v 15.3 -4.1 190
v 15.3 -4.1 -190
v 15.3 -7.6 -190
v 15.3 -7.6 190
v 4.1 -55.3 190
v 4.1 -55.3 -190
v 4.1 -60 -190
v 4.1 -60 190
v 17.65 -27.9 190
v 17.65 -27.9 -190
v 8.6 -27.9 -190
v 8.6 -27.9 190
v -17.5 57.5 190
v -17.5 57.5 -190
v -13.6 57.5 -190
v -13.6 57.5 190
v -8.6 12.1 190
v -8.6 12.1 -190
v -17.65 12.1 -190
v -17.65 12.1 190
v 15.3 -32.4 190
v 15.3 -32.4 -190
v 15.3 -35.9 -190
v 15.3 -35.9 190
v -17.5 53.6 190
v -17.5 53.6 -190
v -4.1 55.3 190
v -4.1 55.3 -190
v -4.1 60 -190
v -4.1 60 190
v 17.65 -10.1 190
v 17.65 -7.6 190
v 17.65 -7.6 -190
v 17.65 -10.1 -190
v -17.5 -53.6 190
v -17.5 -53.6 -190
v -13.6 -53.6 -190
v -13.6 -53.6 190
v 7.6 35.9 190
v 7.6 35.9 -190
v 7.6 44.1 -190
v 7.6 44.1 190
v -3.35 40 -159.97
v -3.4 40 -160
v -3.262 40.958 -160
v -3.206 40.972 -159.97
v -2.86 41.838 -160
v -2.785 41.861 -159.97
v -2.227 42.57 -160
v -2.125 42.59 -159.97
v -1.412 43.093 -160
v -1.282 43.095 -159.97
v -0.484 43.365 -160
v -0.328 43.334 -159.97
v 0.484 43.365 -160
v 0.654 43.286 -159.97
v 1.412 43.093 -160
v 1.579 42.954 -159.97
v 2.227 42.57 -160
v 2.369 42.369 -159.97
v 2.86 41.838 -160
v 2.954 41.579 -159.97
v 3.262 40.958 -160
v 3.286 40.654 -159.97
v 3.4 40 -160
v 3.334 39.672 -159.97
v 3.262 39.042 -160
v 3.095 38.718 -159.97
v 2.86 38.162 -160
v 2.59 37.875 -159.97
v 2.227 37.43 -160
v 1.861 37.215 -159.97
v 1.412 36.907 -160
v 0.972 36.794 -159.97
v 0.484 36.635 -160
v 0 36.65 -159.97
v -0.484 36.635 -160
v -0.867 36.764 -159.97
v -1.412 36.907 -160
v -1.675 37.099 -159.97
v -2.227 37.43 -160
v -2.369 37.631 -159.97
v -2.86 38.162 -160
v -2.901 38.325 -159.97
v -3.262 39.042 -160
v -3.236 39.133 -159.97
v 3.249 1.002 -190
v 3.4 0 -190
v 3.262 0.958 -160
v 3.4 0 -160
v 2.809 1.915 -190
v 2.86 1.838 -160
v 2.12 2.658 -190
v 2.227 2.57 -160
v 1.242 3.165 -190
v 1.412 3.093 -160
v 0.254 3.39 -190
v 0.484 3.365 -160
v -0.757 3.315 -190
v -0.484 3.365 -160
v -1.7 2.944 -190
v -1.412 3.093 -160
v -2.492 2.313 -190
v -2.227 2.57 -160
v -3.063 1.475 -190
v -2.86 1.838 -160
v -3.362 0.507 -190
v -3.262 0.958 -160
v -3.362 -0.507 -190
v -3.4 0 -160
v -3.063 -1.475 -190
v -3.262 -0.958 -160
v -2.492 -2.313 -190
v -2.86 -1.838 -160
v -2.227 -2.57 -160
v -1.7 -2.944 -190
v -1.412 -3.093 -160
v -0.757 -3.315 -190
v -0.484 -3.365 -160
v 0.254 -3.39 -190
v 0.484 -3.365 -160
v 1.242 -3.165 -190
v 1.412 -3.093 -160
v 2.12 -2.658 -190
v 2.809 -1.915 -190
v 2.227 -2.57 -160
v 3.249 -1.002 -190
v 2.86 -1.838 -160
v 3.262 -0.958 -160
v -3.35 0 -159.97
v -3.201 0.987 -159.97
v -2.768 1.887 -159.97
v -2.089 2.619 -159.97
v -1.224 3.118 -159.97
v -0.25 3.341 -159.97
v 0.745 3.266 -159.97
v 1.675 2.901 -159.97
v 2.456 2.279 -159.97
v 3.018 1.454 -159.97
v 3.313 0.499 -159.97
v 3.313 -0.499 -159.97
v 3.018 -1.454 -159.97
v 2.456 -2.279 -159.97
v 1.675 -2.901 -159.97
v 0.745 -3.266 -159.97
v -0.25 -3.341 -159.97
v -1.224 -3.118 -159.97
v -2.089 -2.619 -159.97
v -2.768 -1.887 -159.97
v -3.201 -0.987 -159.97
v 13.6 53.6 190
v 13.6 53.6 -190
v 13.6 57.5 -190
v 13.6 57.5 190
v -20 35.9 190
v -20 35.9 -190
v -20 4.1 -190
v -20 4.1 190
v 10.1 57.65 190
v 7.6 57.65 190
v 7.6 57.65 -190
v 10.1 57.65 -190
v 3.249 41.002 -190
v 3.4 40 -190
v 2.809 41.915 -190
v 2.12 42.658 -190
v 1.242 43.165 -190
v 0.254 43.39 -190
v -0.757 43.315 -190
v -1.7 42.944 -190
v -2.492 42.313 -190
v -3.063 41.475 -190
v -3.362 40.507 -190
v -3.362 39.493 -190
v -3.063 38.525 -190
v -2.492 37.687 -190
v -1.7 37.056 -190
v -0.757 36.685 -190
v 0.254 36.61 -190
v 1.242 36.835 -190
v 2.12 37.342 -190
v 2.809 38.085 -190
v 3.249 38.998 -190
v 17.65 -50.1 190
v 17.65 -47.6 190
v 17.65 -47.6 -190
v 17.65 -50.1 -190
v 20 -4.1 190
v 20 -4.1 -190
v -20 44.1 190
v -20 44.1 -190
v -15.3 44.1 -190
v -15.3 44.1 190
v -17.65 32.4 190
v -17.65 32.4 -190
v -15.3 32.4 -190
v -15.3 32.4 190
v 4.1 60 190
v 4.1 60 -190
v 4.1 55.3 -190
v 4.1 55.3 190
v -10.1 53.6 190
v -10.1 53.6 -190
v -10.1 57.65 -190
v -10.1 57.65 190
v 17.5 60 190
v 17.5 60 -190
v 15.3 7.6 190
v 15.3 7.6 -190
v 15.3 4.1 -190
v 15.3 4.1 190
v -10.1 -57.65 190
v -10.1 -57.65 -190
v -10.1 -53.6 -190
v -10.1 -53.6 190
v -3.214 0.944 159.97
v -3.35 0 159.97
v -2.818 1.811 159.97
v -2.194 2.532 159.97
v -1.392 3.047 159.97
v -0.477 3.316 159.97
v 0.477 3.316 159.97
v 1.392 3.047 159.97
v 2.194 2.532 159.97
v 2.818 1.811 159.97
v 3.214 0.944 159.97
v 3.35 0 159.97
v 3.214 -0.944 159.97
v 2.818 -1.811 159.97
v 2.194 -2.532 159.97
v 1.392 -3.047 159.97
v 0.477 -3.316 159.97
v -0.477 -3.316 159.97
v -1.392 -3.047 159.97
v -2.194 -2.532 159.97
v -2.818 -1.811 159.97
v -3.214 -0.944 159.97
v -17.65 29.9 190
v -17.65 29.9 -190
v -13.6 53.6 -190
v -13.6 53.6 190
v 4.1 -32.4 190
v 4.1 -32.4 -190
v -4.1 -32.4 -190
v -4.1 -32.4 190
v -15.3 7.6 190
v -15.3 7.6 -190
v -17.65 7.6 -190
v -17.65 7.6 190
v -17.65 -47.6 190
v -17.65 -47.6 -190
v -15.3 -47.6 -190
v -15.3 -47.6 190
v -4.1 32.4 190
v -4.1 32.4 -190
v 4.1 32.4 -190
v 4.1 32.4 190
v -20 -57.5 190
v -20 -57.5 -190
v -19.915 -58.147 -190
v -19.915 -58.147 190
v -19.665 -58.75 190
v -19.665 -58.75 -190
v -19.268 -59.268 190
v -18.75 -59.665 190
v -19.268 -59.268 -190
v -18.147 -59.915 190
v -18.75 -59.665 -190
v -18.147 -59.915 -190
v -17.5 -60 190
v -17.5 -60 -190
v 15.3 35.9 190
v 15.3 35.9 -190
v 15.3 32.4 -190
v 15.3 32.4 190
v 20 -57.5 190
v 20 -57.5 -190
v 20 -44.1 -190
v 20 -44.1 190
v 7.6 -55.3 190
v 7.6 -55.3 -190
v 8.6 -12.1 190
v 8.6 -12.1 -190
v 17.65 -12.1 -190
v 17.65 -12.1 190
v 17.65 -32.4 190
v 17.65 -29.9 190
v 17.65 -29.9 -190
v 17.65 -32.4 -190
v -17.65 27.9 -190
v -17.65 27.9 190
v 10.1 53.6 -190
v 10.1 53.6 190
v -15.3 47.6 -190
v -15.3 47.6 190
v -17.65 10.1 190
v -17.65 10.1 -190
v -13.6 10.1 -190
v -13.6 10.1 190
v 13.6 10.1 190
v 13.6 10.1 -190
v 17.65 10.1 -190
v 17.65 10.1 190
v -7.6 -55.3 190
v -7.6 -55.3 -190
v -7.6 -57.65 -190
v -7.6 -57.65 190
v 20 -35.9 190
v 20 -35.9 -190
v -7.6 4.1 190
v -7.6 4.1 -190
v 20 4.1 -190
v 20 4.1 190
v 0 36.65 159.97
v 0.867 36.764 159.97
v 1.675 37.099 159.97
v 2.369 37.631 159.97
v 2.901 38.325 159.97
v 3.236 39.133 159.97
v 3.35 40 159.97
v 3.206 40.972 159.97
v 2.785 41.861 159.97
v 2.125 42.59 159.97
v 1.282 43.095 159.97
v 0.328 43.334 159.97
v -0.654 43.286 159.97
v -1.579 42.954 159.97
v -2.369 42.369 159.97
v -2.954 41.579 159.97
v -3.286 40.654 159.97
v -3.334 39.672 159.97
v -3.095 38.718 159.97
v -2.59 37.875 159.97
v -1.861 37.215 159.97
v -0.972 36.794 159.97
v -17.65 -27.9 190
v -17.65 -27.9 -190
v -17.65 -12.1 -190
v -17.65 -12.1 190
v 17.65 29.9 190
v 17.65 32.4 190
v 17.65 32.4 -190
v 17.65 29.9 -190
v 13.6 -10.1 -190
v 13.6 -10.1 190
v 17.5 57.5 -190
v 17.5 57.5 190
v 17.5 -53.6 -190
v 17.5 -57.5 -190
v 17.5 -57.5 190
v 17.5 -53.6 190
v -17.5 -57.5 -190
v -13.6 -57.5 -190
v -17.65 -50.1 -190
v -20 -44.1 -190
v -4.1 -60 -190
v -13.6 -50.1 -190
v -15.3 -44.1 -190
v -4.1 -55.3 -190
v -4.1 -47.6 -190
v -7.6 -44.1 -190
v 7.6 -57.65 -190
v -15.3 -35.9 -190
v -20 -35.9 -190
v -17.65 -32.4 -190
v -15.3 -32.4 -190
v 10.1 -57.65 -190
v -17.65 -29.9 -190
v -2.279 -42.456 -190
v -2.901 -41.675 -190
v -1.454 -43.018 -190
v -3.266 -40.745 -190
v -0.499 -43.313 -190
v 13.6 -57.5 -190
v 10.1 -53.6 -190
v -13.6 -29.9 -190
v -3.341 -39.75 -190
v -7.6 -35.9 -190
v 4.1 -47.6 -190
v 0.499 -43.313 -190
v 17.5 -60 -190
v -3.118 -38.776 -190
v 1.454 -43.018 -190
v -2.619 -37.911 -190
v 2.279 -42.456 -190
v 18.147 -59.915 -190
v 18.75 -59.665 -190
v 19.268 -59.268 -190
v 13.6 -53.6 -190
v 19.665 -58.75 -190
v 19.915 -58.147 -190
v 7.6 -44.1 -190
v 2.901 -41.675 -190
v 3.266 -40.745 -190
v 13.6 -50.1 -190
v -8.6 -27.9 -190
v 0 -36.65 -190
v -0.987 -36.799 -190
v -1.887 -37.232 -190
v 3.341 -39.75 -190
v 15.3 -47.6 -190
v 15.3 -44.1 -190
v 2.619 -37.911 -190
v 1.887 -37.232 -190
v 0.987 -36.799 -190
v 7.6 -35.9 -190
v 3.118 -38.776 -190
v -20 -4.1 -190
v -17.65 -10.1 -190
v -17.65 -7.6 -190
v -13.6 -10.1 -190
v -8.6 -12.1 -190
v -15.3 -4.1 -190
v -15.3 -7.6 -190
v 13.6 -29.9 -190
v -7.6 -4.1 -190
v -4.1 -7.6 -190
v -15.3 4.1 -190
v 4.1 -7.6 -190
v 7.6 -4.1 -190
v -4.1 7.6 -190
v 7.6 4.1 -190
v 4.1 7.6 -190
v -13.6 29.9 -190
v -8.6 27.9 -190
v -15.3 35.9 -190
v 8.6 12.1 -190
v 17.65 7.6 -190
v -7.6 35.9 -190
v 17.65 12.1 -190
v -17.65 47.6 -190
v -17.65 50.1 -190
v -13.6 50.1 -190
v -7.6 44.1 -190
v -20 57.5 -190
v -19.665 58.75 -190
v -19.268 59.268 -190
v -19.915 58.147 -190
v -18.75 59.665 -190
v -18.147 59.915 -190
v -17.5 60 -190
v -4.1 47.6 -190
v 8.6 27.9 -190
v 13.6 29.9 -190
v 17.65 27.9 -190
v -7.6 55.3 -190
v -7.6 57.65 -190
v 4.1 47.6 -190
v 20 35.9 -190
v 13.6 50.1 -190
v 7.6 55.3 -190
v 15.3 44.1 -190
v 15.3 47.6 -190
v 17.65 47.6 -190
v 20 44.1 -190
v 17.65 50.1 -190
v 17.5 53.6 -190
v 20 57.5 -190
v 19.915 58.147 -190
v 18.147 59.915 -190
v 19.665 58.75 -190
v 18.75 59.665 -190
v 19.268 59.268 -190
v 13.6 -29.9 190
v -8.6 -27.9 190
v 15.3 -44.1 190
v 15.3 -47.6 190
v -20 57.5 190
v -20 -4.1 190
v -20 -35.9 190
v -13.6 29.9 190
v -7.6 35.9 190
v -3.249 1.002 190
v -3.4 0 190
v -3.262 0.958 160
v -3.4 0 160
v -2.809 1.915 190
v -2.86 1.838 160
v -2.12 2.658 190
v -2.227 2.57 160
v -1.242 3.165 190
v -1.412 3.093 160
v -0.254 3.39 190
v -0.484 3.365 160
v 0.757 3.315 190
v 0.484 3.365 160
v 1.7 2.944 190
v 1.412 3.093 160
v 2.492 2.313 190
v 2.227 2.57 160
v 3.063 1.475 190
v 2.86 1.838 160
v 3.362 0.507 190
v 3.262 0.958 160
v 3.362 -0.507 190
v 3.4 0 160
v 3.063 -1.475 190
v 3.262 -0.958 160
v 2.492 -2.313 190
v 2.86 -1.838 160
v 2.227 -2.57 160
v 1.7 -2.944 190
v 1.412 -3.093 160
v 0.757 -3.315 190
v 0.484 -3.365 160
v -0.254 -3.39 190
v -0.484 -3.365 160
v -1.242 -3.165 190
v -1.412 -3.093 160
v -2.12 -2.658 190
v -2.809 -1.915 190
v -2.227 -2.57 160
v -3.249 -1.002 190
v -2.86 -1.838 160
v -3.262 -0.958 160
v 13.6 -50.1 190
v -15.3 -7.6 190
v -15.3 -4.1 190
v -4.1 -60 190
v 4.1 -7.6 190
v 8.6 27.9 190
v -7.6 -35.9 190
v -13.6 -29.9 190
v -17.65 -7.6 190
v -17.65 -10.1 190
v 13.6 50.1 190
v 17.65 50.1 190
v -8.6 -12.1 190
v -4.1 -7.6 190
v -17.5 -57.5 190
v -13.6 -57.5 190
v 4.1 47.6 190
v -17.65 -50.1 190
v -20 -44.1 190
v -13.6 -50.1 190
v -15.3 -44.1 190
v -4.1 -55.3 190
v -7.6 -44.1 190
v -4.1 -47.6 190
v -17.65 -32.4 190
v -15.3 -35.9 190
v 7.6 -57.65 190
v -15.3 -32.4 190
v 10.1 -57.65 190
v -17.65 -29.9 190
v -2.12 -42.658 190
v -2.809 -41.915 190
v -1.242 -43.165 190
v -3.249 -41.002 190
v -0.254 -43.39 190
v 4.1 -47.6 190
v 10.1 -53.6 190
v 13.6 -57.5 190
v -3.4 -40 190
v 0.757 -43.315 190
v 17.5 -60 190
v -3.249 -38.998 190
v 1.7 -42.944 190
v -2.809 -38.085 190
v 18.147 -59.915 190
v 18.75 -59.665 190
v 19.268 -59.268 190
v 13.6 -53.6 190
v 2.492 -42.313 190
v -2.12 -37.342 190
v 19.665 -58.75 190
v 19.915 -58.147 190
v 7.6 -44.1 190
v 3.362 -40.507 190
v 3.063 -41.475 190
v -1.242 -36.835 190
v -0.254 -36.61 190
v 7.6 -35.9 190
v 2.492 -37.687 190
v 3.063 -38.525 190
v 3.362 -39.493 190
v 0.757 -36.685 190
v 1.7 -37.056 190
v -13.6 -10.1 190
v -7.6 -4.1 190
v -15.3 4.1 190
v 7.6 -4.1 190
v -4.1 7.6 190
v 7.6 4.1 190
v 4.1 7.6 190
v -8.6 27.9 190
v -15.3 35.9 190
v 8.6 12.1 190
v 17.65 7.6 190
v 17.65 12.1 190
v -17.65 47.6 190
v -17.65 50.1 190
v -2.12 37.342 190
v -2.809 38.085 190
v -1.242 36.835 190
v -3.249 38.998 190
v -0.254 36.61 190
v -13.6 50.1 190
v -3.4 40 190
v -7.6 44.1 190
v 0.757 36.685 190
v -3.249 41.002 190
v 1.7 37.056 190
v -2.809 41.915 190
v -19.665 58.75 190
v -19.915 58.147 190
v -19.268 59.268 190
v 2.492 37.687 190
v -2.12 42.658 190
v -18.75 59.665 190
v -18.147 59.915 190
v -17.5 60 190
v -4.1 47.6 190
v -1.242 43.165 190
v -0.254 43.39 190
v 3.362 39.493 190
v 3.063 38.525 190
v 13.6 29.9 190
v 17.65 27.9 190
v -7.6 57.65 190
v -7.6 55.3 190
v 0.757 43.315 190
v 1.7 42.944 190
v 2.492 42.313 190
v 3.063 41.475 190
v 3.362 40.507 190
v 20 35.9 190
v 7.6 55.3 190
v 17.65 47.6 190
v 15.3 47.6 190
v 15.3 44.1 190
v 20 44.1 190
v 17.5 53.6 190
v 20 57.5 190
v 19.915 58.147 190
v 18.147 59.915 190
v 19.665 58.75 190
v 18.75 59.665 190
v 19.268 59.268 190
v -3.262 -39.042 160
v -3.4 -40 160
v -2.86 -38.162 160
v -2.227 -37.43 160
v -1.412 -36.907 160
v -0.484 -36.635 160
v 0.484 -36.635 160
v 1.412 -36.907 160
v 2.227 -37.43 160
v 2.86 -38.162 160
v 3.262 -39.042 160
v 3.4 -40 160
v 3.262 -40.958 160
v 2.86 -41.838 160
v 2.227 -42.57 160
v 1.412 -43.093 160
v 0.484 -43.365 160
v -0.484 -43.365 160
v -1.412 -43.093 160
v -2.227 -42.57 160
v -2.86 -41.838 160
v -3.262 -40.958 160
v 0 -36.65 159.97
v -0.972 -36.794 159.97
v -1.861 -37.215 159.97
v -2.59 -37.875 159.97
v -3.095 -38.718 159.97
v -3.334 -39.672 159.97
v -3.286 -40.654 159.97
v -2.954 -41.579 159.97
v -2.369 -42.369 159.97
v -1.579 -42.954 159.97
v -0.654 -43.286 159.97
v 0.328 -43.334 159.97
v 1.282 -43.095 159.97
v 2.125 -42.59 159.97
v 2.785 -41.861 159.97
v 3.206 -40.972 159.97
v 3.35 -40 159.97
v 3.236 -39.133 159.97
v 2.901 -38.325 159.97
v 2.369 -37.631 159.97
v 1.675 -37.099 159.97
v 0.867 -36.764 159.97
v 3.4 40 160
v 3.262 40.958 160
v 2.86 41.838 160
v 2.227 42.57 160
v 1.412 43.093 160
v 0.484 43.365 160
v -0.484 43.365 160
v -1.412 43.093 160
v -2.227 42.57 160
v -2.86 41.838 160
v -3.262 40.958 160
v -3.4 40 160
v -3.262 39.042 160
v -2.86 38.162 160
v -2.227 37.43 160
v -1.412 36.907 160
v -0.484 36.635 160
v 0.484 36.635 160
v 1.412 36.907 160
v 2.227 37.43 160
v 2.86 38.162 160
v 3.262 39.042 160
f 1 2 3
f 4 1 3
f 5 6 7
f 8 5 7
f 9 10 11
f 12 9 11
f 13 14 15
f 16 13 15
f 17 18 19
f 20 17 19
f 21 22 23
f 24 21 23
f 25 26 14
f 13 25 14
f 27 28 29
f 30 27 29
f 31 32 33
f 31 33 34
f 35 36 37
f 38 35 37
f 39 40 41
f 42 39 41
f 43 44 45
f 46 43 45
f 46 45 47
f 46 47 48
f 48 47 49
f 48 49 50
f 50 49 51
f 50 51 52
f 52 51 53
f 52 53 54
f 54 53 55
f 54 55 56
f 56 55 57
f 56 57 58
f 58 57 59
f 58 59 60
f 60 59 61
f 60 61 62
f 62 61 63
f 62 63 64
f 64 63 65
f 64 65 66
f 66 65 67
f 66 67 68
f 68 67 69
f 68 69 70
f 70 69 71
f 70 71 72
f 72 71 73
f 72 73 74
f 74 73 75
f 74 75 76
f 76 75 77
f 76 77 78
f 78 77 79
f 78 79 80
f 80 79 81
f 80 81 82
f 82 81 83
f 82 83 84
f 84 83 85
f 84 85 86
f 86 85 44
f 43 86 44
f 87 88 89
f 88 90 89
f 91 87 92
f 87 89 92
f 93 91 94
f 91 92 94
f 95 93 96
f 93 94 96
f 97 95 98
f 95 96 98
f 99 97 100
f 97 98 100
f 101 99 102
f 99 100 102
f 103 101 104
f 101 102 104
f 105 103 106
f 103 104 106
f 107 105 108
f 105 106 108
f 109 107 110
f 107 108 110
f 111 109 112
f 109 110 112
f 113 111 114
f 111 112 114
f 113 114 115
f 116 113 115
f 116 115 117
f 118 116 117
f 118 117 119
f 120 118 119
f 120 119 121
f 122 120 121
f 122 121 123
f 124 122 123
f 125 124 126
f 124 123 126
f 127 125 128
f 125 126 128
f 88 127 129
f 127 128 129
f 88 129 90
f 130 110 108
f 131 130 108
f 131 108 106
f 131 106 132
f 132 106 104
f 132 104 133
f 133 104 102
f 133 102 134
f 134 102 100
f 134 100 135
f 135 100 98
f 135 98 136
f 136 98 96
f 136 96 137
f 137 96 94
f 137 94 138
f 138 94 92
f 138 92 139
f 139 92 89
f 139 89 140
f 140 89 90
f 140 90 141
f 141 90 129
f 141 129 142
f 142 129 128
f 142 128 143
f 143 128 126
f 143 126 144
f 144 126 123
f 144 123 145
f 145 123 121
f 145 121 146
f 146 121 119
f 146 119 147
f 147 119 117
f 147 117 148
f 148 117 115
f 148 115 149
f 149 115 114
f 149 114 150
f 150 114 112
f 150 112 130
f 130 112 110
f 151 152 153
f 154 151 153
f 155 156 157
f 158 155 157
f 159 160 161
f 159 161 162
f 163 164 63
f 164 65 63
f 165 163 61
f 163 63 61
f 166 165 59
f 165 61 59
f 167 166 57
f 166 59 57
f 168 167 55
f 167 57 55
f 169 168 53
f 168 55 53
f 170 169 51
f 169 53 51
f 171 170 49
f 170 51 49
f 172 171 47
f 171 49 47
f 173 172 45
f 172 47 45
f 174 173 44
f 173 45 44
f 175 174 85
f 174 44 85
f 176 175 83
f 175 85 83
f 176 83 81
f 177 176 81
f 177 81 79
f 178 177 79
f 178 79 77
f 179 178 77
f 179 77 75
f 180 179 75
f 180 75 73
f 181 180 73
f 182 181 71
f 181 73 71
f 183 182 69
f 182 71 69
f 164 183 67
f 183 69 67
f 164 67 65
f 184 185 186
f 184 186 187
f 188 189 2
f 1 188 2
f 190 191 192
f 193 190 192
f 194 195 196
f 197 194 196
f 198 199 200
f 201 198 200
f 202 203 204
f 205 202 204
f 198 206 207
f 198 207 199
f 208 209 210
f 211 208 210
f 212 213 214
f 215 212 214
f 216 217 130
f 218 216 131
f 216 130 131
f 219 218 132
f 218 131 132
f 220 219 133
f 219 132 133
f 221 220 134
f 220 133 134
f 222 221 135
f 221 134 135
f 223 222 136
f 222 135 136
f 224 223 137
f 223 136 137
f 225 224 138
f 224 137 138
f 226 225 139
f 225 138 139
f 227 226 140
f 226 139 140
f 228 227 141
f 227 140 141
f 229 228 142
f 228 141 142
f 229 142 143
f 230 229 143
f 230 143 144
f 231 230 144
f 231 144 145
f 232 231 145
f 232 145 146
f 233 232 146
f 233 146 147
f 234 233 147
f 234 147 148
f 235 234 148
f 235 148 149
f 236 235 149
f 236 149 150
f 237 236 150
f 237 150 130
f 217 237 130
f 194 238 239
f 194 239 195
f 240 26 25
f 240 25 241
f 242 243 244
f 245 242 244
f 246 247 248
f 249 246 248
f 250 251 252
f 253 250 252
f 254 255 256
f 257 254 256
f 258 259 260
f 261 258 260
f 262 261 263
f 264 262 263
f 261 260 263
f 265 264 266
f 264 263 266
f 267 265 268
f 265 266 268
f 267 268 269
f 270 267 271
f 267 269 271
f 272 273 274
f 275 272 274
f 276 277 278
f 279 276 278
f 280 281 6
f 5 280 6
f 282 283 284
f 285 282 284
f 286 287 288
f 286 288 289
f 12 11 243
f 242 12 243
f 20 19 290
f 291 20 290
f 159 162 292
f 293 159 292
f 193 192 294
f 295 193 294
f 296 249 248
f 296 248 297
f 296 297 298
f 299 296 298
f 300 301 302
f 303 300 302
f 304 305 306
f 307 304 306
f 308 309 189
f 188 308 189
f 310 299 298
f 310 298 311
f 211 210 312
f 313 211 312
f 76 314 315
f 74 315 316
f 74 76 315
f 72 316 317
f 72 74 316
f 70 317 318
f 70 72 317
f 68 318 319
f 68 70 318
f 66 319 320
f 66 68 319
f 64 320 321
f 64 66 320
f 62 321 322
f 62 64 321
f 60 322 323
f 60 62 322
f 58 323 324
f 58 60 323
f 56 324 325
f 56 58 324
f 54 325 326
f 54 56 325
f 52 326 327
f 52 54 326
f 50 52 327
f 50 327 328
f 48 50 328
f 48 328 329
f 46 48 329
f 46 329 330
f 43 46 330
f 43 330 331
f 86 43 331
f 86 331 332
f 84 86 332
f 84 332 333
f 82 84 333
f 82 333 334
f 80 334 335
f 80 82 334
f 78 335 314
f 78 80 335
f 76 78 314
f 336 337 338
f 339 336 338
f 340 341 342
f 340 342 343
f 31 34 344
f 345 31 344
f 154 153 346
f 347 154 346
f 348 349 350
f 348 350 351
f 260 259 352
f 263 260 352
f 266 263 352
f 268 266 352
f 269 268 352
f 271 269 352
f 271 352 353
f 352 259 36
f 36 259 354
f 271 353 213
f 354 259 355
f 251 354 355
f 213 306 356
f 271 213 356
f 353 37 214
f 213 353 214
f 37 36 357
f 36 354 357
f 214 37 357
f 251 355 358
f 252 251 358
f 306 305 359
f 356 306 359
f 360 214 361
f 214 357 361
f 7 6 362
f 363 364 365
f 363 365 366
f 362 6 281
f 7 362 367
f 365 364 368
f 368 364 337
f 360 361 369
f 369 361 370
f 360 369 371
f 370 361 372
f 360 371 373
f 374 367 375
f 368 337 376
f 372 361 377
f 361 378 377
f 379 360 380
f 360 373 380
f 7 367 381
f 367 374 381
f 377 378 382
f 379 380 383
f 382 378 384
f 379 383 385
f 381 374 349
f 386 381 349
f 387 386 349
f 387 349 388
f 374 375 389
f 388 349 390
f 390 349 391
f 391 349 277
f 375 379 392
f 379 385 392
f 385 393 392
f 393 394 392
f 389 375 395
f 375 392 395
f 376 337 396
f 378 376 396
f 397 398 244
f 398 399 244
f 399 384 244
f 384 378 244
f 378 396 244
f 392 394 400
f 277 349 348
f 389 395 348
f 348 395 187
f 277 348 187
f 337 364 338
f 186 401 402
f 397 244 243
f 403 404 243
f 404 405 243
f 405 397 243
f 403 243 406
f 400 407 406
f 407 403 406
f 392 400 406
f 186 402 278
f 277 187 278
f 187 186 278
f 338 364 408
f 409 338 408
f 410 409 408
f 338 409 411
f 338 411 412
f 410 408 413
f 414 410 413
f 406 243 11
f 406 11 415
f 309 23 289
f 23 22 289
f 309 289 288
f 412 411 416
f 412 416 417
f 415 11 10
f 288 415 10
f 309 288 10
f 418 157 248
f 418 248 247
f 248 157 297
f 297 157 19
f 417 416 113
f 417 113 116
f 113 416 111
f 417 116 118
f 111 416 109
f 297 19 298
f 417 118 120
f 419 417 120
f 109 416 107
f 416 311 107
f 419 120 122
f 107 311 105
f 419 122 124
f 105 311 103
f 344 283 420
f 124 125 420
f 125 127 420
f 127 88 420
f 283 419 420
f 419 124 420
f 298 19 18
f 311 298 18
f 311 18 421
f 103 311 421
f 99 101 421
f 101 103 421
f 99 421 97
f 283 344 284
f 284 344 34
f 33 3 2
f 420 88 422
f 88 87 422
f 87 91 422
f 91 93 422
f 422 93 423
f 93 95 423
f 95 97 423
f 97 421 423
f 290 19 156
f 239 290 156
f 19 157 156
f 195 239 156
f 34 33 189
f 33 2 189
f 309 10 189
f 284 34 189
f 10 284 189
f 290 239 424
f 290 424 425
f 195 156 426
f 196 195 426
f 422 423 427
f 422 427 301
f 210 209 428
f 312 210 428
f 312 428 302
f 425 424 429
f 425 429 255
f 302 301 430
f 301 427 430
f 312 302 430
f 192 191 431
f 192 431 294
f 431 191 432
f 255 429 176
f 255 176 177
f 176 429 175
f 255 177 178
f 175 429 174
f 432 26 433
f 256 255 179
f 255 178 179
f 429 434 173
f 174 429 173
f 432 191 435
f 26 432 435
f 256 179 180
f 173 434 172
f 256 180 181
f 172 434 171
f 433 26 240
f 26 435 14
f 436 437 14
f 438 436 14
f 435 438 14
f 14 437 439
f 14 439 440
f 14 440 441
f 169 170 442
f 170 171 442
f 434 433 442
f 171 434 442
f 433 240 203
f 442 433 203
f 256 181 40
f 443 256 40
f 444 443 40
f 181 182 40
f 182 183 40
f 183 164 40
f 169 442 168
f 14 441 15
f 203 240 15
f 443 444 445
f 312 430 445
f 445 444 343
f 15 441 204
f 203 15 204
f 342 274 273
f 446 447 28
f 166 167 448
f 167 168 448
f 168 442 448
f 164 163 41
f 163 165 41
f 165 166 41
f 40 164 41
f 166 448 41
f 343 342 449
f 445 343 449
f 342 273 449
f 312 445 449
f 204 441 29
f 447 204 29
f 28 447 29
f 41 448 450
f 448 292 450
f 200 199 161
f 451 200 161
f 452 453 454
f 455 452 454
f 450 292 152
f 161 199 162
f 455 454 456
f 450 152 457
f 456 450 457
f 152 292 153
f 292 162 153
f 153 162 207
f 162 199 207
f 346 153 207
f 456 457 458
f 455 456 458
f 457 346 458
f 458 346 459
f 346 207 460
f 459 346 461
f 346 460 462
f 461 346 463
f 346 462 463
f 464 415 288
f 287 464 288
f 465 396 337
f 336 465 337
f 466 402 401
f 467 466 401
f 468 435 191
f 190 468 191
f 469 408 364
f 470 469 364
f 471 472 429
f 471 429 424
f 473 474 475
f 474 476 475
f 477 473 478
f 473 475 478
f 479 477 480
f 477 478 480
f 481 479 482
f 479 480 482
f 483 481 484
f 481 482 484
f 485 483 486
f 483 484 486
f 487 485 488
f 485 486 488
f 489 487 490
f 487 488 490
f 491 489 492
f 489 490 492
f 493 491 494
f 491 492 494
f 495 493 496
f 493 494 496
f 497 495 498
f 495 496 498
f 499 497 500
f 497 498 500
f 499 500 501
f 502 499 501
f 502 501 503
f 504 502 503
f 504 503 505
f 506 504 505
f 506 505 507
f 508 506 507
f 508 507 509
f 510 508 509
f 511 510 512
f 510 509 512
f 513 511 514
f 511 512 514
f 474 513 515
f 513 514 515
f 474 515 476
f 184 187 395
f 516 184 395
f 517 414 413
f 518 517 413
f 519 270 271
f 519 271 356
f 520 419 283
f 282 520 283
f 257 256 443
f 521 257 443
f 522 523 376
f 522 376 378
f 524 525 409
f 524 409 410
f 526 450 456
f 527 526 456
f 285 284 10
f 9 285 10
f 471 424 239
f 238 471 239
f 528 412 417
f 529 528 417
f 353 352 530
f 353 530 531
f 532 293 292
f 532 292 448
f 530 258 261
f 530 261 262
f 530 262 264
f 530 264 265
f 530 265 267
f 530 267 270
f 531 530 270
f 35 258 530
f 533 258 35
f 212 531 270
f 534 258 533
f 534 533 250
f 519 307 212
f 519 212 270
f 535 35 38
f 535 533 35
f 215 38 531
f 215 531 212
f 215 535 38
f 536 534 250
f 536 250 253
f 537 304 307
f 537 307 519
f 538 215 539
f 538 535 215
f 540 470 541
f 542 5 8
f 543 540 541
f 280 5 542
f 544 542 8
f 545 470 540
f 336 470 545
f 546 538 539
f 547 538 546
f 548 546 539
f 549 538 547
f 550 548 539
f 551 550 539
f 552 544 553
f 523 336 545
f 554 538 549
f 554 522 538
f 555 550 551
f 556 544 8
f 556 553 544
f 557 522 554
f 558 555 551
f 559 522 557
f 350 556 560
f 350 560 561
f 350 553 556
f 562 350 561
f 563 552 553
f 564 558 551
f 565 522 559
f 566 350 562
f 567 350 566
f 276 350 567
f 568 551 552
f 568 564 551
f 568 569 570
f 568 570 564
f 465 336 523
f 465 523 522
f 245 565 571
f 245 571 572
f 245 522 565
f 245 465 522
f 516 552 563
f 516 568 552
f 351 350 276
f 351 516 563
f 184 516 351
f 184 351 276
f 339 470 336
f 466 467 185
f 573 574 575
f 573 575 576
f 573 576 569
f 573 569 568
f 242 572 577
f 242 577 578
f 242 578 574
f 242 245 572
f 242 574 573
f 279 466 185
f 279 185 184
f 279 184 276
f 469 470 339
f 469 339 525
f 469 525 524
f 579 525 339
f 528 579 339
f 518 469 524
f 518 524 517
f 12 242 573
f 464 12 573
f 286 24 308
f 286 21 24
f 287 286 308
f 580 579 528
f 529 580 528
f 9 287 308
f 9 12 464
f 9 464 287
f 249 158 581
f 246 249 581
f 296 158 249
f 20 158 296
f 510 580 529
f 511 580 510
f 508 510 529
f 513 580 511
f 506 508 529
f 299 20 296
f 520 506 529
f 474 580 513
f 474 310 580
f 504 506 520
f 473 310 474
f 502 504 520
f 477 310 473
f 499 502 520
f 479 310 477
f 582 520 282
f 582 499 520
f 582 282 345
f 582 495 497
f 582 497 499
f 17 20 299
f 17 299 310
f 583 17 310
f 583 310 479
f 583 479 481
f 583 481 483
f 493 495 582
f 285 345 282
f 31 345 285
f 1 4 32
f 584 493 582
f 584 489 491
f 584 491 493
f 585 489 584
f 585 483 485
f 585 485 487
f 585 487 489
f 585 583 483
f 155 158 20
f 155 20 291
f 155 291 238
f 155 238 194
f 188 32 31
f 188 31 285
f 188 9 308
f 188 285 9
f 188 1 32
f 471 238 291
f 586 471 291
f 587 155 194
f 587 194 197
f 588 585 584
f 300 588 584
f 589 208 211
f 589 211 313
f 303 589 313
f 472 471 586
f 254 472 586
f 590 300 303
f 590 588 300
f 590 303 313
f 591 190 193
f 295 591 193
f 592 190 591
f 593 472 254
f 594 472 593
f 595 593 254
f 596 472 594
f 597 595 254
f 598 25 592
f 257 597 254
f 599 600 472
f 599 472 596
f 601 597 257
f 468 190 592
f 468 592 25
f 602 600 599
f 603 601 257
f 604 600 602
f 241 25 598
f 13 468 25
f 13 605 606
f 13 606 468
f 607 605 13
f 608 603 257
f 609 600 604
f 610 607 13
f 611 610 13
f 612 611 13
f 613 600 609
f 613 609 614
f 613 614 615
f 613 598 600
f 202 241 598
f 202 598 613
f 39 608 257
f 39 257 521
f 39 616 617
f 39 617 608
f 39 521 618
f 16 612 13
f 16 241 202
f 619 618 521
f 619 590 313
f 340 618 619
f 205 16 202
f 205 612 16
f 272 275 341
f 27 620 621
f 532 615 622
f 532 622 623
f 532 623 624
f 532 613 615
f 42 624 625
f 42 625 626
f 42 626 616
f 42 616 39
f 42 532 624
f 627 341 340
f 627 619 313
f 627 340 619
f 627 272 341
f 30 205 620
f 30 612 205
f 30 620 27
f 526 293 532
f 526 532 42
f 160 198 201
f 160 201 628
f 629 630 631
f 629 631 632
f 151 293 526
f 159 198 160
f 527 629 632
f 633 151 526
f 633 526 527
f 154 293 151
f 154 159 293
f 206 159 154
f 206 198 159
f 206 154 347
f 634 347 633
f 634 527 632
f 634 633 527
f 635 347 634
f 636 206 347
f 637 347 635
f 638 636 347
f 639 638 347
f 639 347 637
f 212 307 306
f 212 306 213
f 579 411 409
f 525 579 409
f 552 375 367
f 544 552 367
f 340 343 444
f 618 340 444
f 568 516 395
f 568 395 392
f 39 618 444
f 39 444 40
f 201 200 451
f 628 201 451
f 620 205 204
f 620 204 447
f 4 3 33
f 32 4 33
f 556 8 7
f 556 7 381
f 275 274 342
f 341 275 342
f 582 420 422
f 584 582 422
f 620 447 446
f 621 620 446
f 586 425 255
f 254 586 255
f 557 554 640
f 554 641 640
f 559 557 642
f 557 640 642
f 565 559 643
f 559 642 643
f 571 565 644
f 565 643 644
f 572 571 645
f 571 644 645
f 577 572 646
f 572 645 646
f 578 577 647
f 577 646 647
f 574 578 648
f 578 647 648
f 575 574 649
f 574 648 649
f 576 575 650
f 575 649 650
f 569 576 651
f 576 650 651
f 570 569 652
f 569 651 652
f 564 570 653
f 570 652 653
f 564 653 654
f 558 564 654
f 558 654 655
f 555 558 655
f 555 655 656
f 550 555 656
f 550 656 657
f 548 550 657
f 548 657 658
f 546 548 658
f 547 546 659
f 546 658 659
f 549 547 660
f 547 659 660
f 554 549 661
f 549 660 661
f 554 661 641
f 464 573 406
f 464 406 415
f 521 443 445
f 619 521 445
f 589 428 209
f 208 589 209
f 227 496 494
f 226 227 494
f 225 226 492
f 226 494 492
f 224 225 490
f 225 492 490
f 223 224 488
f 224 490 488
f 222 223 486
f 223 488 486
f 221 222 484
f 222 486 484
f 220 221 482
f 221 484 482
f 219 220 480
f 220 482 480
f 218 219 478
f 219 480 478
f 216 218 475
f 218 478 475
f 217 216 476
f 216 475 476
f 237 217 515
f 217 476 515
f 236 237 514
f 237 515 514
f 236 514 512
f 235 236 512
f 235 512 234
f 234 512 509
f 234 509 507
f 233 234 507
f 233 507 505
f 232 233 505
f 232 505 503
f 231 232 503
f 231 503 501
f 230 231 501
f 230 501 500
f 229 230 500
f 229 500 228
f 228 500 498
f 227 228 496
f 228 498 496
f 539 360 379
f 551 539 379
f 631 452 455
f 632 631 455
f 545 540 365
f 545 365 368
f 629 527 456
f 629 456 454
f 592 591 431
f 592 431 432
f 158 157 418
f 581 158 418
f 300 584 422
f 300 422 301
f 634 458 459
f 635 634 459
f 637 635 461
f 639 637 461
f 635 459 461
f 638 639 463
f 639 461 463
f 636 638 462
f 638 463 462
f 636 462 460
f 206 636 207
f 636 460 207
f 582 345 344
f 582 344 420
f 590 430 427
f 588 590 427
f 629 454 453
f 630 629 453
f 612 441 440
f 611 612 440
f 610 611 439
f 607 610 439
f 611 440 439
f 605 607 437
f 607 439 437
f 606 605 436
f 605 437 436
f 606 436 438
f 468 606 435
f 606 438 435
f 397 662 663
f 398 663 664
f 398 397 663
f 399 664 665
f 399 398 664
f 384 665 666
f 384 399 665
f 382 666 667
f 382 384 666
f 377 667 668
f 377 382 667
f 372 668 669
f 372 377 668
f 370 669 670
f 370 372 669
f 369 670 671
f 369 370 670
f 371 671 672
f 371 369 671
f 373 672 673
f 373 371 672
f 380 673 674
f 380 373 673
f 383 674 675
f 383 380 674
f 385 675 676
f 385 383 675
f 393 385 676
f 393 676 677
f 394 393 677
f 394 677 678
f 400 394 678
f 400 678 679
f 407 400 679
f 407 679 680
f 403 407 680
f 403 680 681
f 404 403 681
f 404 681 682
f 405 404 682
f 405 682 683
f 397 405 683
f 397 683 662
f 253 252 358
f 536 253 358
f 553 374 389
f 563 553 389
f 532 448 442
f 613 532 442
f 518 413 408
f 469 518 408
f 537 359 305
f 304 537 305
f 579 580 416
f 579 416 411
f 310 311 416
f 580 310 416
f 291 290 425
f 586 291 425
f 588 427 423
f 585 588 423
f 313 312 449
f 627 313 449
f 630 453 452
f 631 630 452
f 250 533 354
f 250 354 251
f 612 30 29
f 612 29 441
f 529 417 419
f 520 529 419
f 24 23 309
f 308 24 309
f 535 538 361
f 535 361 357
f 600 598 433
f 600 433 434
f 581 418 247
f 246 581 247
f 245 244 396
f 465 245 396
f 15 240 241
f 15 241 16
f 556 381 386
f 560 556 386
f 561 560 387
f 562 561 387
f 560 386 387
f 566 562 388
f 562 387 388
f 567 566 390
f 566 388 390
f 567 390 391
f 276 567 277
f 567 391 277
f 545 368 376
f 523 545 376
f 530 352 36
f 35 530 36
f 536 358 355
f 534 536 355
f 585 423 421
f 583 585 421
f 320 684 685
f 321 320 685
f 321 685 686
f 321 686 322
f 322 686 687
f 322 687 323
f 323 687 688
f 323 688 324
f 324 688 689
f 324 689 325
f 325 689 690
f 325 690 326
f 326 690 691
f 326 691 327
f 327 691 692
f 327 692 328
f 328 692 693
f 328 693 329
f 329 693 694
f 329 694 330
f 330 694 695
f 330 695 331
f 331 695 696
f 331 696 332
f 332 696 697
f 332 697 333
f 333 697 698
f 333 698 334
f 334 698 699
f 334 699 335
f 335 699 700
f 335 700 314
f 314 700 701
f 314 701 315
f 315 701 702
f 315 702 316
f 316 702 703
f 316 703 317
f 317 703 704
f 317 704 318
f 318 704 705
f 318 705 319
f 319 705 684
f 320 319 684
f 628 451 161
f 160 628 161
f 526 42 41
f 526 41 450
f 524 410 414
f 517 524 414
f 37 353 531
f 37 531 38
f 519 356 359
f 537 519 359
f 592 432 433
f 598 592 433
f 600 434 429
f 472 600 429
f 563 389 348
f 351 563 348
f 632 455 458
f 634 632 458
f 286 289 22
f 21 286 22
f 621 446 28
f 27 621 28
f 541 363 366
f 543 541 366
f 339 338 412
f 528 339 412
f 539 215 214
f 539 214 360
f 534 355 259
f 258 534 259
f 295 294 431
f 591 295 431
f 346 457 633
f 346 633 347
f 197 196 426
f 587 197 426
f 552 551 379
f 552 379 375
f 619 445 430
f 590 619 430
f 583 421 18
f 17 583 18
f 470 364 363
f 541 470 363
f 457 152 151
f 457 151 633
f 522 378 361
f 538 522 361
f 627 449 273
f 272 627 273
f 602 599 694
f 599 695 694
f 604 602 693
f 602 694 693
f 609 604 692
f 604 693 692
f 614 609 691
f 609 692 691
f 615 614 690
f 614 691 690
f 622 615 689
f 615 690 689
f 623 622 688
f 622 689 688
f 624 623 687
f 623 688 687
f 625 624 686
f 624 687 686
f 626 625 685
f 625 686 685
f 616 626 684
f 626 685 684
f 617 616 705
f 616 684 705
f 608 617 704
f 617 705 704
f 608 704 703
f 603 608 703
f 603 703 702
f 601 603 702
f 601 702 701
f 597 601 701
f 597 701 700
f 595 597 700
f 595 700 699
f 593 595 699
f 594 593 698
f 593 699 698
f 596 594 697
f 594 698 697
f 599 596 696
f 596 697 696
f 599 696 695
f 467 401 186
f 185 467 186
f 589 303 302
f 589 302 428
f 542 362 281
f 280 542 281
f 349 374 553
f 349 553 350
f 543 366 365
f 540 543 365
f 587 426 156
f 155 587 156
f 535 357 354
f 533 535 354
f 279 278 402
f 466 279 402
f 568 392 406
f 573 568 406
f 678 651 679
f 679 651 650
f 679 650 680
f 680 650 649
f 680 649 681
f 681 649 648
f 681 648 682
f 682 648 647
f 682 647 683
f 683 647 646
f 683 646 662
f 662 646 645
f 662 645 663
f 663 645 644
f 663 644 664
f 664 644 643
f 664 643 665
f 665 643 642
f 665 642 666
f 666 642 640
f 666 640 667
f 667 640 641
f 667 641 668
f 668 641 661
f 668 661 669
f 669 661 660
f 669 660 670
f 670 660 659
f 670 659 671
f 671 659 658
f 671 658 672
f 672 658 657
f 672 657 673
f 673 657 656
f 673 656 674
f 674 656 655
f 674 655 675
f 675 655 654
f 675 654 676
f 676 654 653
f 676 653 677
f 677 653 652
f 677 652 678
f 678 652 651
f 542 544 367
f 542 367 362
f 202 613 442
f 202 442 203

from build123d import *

# Parameters (mm, degrees)
SKETCH2_W                      = 3.9
SKETCH2_H                      = 3.9
F_40_SERIES_TS40_120LM_1_DEPTH = 380
M8X1_25_TAPPED_HOLE1_D         = 6.8
M8X1_25_TAPPED_HOLE1_DEPTH     = 30
M8X1_25_TAPPED_HOLE1_TIP       = 2.042926105
M8X1_25_TAPPED_HOLE2_D         = 6.8
M8X1_25_TAPPED_HOLE2_DEPTH     = 30
M8X1_25_TAPPED_HOLE2_TIP       = 2.042926105


with BuildPart() as part:
    # Sketch2 → 40 series TS40-120LM(1) (new body)
    with BuildSketch(Plane.XY.offset(-190)):
        with BuildLine():
            Line((15.3, -35.9), (20, -35.9))
            Line((20, -35.9), (20, -4.1))
            Line((20, -4.1), (15.3, -4.1))
            Line((15.3, -4.1), (15.3, -7.6))
            Line((15.3, -7.6), (17.65, -7.6))
            Line((17.65, -7.6), (17.65, -10.1))
            Line((17.65, -10.1), (13.6, -10.1))
            Line((13.6, -10.1), (7.6, -4.1))
            Line((7.6, -4.1), (7.6, 4.1))
            Line((7.6, 4.1), (13.6, 10.1))
            Line((13.6, 10.1), (17.65, 10.1))
            Line((17.65, 10.1), (17.65, 7.6))
            Line((17.65, 7.6), (15.3, 7.6))
            Line((15.3, 7.6), (15.3, 4.1))
            Line((15.3, 4.1), (20, 4.1))
            Line((20, 4.1), (20, 35.9))
            Line((20, 35.9), (15.3, 35.9))
            Line((15.3, 35.9), (15.3, 32.4))
            Line((15.3, 32.4), (17.65, 32.4))
            Line((17.65, 32.4), (17.65, 29.9))
            Line((17.65, 29.9), (13.6, 29.9))
            Line((13.6, 29.9), (7.6, 35.9))
            Line((7.6, 35.9), (7.6, 44.1))
            Line((7.6, 44.1), (13.6, 50.1))
            Line((13.6, 50.1), (17.65, 50.1))
            Line((17.65, 50.1), (17.65, 47.6))
            Line((17.65, 47.6), (15.3, 47.6))
            Line((15.3, 47.6), (15.3, 44.1))
            Line((15.3, 44.1), (20, 44.1))
            Line((20, 44.1), (20, 57.5))
            ThreePointArc((20, 57.5), (19.267766953, 59.267766953), (17.5, 60))
            Line((17.5, 60), (4.1, 60))
            Line((4.1, 60), (4.1, 55.3))
            Line((4.1, 55.3), (7.6, 55.3))
            Line((7.6, 55.3), (7.6, 57.65))
            Line((7.6, 57.65), (10.1, 57.65))
            Line((10.1, 57.65), (10.1, 53.6))
            Line((10.1, 53.6), (4.1, 47.6))
            Line((4.1, 47.6), (-4.1, 47.6))
            Line((-4.1, 47.6), (-10.1, 53.6))
            Line((-10.1, 53.6), (-10.1, 57.65))
            Line((-10.1, 57.65), (-7.6, 57.65))
            Line((-7.6, 57.65), (-7.6, 55.3))
            Line((-7.6, 55.3), (-4.1, 55.3))
            Line((-4.1, 55.3), (-4.1, 60))
            Line((-4.1, 60), (-17.5, 60))
            ThreePointArc((-17.5, 60), (-19.267766953, 59.267766953), (-20, 57.5))
            Line((-20, 57.5), (-20, 44.1))
            Line((-20, 44.1), (-15.3, 44.1))
            Line((-15.3, 44.1), (-15.3, 47.6))
            Line((-15.3, 47.6), (-17.65, 47.6))
            Line((-17.65, 47.6), (-17.65, 50.1))
            Line((-17.65, 50.1), (-13.6, 50.1))
            Line((-13.6, 50.1), (-7.6, 44.1))
            Line((-7.6, 44.1), (-7.6, 35.9))
            Line((-7.6, 35.9), (-13.6, 29.9))
            Line((-13.6, 29.9), (-17.65, 29.9))
            Line((-17.65, 29.9), (-17.65, 32.4))
            Line((-17.65, 32.4), (-15.3, 32.4))
            Line((-15.3, 32.4), (-15.3, 35.9))
            Line((-15.3, 35.9), (-20, 35.9))
            Line((-20, 35.9), (-20, 4.1))
            Line((-20, 4.1), (-15.3, 4.1))
            Line((-15.3, 4.1), (-15.3, 7.6))
            Line((-15.3, 7.6), (-17.65, 7.6))
            Line((-17.65, 7.6), (-17.65, 10.1))
            Line((-17.65, 10.1), (-13.6, 10.1))
            Line((-13.6, 10.1), (-7.6, 4.1))
            Line((-7.6, 4.1), (-7.6, -4.1))
            Line((-7.6, -4.1), (-13.6, -10.1))
            Line((-13.6, -10.1), (-17.65, -10.1))
            Line((-17.65, -10.1), (-17.65, -7.6))
            Line((-17.65, -7.6), (-15.3, -7.6))
            Line((-15.3, -7.6), (-15.3, -4.1))
            Line((-15.3, -4.1), (-20, -4.1))
            Line((-20, -4.1), (-20, -35.9))
            Line((-20, -35.9), (-15.3, -35.9))
            Line((-15.3, -35.9), (-15.3, -32.4))
            Line((-15.3, -32.4), (-17.65, -32.4))
            Line((-17.65, -32.4), (-17.65, -29.9))
            Line((-17.65, -29.9), (-13.6, -29.9))
            Line((-13.6, -29.9), (-7.6, -35.9))
            Line((-7.6, -35.9), (-7.6, -44.1))
            Line((-7.6, -44.1), (-13.6, -50.1))
            Line((-13.6, -50.1), (-17.65, -50.1))
            Line((-17.65, -50.1), (-17.65, -47.6))
            Line((-17.65, -47.6), (-15.3, -47.6))
            Line((-15.3, -47.6), (-15.3, -44.1))
            Line((-15.3, -44.1), (-20, -44.1))
            Line((-20, -44.1), (-20, -57.5))
            ThreePointArc((-20, -57.5), (-19.267766953, -59.267766953), (-17.5, -60))
            Line((-17.5, -60), (-4.1, -60))
            Line((-4.1, -60), (-4.1, -55.3))
            Line((-4.1, -55.3), (-7.6, -55.3))
            Line((-7.6, -55.3), (-7.6, -57.65))
            Line((-7.6, -57.65), (-10.1, -57.65))
            Line((-10.1, -57.65), (-10.1, -53.6))
            Line((-10.1, -53.6), (-4.1, -47.6))
            Line((-4.1, -47.6), (4.1, -47.6))
            Line((4.1, -47.6), (10.1, -53.6))
            Line((10.1, -53.6), (10.1, -57.65))
            Line((10.1, -57.65), (7.6, -57.65))
            Line((7.6, -57.65), (7.6, -55.3))
            Line((7.6, -55.3), (4.1, -55.3))
            Line((4.1, -55.3), (4.1, -60))
            Line((4.1, -60), (17.5, -60))
            ThreePointArc((17.5, -60), (19.267766953, -59.267766953), (20, -57.5))
            Line((20, -57.5), (20, -44.1))
            Line((20, -44.1), (15.3, -44.1))
            Line((15.3, -44.1), (15.3, -47.6))
            Line((15.3, -47.6), (17.65, -47.6))
            Line((17.65, -47.6), (17.65, -50.1))
            Line((17.65, -50.1), (13.6, -50.1))
            Line((13.6, -50.1), (7.6, -44.1))
            Line((7.6, -44.1), (7.6, -35.9))
            Line((7.6, -35.9), (13.6, -29.9))
            Line((13.6, -29.9), (17.65, -29.9))
            Line((17.65, -29.9), (17.65, -32.4))
            Line((17.65, -32.4), (15.3, -32.4))
            Line((15.3, -32.4), (15.3, -35.9))
        make_face()
        Polygon((-4.1, -7.6), (4.1, -7.6), (8.6, -12.1), (17.65, -12.1), (17.65, -27.9), (8.6, -27.9), (4.1, -32.4), (-4.1, -32.4), (-8.6, -27.9), (-17.65, -27.9), (-17.65, -12.1), (-8.6, -12.1), align=None, mode=Mode.SUBTRACT)
        Polygon((-4.1, 7.6), (-8.6, 12.1), (-17.65, 12.1), (-17.65, 27.9), (-8.6, 27.9), (-4.1, 32.4), (4.1, 32.4), (8.6, 27.9), (17.65, 27.9), (17.65, 12.1), (8.6, 12.1), (4.1, 7.6), align=None, mode=Mode.SUBTRACT)
        with Locations((15.55, -55.55)):
            Rectangle(SKETCH2_W, SKETCH2_H, mode=Mode.SUBTRACT)
        with Locations((-15.55, -55.55)):
            Rectangle(SKETCH2_W, SKETCH2_H, mode=Mode.SUBTRACT)
        with Locations((-15.55, 55.55)):
            Rectangle(SKETCH2_W, SKETCH2_H, mode=Mode.SUBTRACT)
        with Locations((15.55, 55.55)):
            Rectangle(SKETCH2_W, SKETCH2_H, mode=Mode.SUBTRACT)
        with BuildLine():
            ThreePointArc((0, -43.35), (3.35, -40), (0, -36.65))
            ThreePointArc((0, -36.65), (-3.35, -40), (0, -43.35))
        make_face(mode=Mode.SUBTRACT)
        with BuildLine():
            ThreePointArc((3.35, 0), (0, -3.35), (-3.35, 0))
            ThreePointArc((-3.35, 0), (0, 3.35), (3.35, 0))
        make_face(mode=Mode.SUBTRACT)
        with BuildLine():
            ThreePointArc((0, 43.35), (-3.35, 40), (0, 36.65))
            ThreePointArc((0, 36.65), (3.35, 40), (0, 43.35))
        make_face(mode=Mode.SUBTRACT)
    extrude(amount=F_40_SERIES_TS40_120LM_1_DEPTH)

    # M8x1.25 Tapped Hole1
    with Locations(Plane.XY.offset(190)):
        with Locations((0, 40), (0, 0), (0, -40)):
            Hole(M8X1_25_TAPPED_HOLE1_D / 2, depth=M8X1_25_TAPPED_HOLE1_DEPTH)
            with Locations((0, 0, -(M8X1_25_TAPPED_HOLE1_DEPTH + M8X1_25_TAPPED_HOLE1_TIP / 2))):  # 118° drill point
                Cone(0, M8X1_25_TAPPED_HOLE1_D / 2, M8X1_25_TAPPED_HOLE1_TIP, mode=Mode.SUBTRACT)

    # M8x1.25 Tapped Hole2
    with Locations(Plane(origin=(0, 0, -190), x_dir=(-1, 0, 0), z_dir=(0, 0, -1))):
        with Locations((0, 40), (0, 0)):
            Hole(M8X1_25_TAPPED_HOLE2_D / 2, depth=M8X1_25_TAPPED_HOLE2_DEPTH)
            with Locations((0, 0, -(M8X1_25_TAPPED_HOLE2_DEPTH + M8X1_25_TAPPED_HOLE2_TIP / 2))):  # 118° drill point
                Cone(0, M8X1_25_TAPPED_HOLE2_D / 2, M8X1_25_TAPPED_HOLE2_TIP, mode=Mode.SUBTRACT)


solid = part.part
